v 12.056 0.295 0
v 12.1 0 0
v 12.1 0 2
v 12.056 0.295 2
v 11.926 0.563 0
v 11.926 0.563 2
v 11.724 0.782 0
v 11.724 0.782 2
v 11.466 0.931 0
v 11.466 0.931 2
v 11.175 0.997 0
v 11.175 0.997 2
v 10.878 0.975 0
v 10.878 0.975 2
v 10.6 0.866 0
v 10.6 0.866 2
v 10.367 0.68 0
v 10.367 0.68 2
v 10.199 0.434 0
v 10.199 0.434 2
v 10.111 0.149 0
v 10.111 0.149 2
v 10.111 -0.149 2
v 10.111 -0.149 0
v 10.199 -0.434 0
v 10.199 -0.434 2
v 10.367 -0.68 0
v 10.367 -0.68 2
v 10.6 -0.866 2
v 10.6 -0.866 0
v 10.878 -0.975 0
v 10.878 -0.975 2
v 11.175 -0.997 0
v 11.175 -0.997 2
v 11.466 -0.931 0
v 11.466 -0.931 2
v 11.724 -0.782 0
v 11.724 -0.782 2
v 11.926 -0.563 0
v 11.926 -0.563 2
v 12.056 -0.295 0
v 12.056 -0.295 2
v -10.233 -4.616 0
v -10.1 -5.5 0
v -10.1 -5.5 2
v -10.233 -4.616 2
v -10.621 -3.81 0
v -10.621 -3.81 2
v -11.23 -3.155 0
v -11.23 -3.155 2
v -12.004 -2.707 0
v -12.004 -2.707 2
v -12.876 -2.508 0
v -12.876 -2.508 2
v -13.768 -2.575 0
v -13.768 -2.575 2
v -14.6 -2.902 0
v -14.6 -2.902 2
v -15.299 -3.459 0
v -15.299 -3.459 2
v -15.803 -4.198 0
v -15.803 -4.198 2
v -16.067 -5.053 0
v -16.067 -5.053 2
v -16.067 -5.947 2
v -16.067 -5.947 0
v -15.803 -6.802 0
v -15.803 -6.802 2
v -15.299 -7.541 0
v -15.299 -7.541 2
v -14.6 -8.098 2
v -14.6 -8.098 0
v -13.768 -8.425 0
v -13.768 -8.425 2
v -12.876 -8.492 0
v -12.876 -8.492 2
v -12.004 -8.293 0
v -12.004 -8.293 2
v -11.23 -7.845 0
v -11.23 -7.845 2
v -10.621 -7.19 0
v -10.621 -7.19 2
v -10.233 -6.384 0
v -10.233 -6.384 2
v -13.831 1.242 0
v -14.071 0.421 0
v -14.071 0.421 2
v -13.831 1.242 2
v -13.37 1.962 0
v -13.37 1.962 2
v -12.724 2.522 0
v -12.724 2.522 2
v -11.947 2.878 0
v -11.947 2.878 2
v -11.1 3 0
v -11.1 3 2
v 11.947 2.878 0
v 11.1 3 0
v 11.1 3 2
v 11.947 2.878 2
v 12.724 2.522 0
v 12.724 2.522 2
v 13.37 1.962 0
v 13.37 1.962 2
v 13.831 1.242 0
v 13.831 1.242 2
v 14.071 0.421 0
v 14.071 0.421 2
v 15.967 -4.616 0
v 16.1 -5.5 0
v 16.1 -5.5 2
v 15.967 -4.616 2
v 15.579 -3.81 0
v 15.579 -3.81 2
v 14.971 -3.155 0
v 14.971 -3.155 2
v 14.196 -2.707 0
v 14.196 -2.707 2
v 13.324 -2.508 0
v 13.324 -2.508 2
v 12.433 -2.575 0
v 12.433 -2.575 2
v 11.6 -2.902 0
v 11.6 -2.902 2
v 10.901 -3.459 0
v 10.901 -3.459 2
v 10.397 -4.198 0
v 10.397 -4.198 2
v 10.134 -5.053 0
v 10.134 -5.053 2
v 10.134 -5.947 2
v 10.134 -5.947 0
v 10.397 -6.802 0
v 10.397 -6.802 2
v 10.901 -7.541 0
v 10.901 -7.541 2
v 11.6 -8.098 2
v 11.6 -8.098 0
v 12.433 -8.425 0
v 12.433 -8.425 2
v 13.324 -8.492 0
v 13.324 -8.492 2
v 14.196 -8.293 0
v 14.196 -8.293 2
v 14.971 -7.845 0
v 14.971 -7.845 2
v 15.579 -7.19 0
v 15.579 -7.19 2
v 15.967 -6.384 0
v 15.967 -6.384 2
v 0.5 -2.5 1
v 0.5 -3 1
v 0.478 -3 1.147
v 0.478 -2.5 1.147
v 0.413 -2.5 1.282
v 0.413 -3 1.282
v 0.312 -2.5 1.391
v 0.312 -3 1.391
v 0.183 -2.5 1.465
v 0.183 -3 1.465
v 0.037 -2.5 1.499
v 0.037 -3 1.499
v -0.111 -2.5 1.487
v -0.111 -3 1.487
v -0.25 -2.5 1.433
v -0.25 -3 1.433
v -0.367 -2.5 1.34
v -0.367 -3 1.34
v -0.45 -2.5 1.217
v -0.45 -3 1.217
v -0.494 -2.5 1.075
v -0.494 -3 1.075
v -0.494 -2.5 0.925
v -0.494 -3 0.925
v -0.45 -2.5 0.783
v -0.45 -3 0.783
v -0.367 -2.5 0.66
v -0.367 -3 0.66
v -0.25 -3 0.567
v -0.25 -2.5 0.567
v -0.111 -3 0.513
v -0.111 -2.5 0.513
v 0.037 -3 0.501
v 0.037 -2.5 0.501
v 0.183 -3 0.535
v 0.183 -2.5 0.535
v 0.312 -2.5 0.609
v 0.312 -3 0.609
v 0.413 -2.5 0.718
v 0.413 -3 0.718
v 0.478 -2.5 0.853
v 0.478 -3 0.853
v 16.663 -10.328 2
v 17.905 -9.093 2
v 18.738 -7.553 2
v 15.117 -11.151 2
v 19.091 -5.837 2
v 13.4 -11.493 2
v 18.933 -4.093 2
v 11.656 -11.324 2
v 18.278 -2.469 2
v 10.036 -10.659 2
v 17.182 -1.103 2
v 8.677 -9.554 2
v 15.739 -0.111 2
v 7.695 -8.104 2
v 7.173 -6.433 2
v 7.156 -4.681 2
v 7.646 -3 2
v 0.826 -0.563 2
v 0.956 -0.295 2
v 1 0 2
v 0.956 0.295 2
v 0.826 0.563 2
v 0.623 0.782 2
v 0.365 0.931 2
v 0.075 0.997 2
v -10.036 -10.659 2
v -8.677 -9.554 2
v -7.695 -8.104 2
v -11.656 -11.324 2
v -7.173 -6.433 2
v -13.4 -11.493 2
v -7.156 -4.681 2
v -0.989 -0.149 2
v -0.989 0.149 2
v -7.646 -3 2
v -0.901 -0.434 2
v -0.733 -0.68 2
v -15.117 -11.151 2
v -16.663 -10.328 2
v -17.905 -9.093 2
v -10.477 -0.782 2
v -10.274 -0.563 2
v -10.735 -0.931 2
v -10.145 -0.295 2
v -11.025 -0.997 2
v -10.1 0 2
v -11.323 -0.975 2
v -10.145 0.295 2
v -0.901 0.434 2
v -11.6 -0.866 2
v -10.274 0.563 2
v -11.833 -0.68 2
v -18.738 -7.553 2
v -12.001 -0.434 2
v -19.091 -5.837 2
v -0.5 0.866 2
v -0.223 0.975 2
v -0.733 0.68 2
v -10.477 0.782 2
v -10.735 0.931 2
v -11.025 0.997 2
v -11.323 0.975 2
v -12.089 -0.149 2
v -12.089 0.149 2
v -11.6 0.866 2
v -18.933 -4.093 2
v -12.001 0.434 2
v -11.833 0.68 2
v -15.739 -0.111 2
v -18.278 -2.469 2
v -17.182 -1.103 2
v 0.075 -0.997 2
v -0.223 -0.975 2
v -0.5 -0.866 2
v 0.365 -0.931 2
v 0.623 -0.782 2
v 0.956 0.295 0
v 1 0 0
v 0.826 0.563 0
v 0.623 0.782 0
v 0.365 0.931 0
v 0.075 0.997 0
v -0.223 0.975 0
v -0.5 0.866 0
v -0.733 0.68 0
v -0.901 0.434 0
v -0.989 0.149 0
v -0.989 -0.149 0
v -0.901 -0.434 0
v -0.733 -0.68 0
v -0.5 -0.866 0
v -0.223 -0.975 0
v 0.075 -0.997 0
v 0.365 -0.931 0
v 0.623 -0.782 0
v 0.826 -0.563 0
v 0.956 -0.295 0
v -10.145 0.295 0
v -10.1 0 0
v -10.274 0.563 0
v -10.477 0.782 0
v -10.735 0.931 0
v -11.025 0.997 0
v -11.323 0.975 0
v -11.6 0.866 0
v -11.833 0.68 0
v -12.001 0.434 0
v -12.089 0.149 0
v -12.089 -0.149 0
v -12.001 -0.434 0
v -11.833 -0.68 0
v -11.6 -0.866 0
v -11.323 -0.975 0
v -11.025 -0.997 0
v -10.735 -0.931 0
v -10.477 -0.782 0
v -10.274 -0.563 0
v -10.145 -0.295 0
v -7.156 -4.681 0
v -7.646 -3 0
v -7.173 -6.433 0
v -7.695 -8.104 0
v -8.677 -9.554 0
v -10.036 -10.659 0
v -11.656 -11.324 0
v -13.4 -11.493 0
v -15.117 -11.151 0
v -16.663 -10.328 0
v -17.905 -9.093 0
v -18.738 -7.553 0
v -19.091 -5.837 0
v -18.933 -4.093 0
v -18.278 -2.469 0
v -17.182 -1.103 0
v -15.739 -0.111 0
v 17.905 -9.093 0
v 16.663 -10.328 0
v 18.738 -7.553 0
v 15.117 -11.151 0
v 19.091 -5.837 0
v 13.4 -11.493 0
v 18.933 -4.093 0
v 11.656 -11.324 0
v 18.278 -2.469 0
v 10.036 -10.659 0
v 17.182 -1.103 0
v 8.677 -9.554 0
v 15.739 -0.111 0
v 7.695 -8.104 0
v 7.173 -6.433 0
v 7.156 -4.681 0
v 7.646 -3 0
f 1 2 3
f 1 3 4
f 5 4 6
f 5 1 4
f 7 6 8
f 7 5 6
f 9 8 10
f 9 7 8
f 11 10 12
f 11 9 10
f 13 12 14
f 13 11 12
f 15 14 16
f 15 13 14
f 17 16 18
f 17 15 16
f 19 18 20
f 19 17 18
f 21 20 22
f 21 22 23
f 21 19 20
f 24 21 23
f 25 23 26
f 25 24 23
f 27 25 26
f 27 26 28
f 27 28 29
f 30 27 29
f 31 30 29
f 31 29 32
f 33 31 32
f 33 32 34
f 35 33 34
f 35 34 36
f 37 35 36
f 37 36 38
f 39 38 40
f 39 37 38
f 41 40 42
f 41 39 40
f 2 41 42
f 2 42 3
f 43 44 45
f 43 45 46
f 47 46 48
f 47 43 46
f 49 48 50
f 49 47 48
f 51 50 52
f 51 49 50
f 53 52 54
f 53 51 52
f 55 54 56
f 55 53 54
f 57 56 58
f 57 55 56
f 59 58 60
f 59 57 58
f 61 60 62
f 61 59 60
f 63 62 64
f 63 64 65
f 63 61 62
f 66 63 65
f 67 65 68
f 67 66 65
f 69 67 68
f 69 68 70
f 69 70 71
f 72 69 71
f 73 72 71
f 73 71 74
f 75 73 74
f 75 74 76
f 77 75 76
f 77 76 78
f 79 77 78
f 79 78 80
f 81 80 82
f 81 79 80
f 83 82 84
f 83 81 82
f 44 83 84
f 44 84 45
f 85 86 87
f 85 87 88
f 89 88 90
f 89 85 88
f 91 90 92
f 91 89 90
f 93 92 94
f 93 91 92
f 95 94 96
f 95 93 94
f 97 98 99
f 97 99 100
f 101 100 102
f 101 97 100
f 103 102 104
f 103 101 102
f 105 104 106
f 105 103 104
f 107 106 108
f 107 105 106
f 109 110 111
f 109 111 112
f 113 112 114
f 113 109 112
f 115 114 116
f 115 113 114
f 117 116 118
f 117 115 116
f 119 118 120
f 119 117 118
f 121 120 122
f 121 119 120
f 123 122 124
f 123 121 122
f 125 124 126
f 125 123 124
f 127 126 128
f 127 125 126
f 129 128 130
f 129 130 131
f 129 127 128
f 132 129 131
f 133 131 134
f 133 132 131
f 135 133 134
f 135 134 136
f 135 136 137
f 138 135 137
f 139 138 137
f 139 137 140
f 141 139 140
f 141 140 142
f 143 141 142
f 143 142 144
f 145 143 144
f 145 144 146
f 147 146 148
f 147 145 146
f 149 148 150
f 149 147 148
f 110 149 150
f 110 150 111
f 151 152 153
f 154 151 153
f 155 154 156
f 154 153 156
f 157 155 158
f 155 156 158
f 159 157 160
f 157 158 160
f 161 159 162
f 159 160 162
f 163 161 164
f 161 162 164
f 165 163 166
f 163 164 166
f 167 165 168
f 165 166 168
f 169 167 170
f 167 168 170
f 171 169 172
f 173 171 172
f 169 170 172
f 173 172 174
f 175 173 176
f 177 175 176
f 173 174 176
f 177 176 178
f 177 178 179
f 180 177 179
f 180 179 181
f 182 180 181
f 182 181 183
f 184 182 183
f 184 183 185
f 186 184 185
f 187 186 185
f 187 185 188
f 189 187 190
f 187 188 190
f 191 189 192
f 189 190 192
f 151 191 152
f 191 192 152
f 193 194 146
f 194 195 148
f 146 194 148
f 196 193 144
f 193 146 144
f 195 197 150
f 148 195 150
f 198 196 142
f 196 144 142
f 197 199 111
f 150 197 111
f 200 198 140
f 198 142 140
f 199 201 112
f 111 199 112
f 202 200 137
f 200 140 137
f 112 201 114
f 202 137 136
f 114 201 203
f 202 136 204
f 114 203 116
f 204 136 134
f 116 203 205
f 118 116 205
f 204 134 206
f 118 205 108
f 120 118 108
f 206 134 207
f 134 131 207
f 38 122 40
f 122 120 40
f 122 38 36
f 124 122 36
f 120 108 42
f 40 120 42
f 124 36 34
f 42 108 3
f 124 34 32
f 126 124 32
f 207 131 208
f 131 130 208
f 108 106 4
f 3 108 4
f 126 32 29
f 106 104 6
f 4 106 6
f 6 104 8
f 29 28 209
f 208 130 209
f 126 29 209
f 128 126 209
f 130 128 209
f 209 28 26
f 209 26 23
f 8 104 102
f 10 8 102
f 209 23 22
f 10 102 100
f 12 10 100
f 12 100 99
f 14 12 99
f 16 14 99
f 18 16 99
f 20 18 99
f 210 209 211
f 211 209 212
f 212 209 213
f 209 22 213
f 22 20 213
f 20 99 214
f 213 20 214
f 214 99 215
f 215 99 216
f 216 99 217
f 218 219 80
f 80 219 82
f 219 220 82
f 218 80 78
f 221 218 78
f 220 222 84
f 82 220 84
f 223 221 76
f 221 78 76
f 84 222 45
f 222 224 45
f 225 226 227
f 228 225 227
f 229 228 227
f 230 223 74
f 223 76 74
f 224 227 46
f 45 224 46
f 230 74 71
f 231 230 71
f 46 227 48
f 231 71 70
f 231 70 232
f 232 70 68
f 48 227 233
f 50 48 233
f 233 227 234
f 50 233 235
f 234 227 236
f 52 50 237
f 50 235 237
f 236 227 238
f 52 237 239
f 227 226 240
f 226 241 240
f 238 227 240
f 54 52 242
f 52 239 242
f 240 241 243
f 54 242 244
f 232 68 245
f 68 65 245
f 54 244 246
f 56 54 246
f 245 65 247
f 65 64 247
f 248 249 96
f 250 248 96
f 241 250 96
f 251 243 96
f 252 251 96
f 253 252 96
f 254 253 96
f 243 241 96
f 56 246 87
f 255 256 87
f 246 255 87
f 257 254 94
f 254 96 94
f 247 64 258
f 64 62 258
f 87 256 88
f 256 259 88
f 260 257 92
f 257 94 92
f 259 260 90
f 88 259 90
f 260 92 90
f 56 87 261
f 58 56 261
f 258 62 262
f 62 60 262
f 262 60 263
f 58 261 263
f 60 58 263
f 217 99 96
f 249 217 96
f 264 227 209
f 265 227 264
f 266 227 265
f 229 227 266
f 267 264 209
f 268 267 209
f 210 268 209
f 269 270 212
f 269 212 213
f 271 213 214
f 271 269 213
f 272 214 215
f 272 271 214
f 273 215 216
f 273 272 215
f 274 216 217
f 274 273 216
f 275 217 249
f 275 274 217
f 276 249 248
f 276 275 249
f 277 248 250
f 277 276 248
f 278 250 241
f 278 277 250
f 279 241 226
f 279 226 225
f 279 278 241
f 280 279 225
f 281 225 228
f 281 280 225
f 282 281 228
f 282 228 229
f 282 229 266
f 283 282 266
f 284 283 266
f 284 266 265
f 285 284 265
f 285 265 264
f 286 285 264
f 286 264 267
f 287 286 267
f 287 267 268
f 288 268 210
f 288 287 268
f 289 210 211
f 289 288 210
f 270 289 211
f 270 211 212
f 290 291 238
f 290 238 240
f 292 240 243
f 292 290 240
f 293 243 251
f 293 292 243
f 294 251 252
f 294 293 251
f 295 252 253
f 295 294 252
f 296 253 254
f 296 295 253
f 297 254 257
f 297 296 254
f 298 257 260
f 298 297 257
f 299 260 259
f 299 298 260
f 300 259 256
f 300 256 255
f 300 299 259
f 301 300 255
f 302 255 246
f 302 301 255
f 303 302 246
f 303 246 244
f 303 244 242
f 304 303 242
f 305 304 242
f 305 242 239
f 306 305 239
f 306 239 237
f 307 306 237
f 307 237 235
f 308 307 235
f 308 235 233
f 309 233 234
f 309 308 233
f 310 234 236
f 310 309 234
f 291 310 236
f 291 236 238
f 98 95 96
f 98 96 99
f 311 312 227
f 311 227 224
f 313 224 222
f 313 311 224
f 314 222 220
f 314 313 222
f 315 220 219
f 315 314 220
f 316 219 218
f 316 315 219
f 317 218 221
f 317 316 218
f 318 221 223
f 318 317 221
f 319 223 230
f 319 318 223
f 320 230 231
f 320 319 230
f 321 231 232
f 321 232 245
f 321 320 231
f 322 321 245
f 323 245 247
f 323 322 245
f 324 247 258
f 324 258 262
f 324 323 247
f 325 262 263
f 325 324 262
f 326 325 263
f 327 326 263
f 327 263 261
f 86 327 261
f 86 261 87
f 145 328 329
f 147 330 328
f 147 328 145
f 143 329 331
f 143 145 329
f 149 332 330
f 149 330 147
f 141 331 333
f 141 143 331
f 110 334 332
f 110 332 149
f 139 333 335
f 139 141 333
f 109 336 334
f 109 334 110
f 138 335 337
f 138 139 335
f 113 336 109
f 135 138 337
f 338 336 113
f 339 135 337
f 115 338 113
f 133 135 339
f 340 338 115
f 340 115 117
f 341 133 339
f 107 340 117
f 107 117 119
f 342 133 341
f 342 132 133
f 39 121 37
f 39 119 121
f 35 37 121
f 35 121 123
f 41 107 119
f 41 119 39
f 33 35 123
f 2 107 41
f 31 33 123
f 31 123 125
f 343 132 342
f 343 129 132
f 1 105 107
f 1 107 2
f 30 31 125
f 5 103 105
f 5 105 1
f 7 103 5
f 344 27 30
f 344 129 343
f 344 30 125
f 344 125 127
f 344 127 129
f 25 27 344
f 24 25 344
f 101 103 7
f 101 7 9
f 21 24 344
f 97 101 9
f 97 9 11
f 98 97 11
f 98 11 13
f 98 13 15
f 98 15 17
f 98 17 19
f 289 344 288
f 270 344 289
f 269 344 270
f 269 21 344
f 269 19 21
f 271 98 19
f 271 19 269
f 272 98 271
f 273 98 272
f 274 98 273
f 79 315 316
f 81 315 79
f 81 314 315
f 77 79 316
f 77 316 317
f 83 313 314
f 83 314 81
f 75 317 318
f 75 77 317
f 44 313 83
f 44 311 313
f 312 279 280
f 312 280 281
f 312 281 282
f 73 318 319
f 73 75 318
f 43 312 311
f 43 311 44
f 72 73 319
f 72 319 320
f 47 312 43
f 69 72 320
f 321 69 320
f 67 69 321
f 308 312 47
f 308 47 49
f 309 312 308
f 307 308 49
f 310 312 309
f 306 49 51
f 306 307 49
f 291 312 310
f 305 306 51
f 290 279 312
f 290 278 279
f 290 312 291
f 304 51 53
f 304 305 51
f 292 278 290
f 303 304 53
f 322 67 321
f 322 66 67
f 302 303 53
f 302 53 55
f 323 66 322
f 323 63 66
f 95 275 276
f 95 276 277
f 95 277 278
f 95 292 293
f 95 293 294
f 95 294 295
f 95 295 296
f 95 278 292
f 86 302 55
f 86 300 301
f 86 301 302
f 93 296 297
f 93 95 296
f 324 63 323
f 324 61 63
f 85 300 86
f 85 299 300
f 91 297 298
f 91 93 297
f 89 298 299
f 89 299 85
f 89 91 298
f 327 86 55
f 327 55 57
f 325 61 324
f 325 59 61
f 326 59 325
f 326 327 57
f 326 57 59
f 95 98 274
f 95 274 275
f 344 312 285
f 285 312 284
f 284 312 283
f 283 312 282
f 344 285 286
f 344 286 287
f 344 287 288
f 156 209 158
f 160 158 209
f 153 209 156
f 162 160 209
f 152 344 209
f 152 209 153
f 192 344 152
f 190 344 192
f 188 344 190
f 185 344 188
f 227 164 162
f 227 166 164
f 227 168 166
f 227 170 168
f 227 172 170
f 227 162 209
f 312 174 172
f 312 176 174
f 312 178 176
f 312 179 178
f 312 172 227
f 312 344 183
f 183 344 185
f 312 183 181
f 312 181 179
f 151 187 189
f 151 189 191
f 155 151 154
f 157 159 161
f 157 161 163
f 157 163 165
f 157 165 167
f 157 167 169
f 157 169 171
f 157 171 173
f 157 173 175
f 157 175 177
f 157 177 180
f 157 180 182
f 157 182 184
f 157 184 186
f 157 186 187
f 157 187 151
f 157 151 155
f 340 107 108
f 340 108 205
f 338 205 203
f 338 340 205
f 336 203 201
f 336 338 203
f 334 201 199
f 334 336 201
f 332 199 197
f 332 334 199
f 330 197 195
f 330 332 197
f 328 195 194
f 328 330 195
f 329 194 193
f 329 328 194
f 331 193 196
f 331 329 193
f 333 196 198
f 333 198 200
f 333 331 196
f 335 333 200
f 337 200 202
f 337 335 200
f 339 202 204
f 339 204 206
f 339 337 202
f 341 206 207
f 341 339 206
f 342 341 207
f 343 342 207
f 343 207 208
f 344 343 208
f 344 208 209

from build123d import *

# Parameters (mm, degrees)
SKETCH1_R           = 1
SKETCH1_R_2         = 3
BOSS_EXTRUDE1_DEPTH = 2
SKETCH2_R           = 0.5
CUT_EXTRUDE1_DEPTH  = 0.5


with BuildPart() as part:
    # Sketch1 → Boss-Extrude1 (new body)
    with BuildSketch(Plane.XY):
        with BuildLine():
            Line((-11.100190374, 3), (11.100190374, 3))
            ThreePointArc((11.100190374, 3), (13.067032348, 2.265288646), (14.070500235, 0.421021768))
            ThreePointArc((14.070500235, 0.421021768), (15.920210774, -10.795987627), (7.645834317, -3))
            Line((7.645834317, -3), (-7.645834317, -3))
            ThreePointArc((-7.645834317, -3), (-15.920210774, -10.795987627), (-14.070500235, 0.421021768))
            ThreePointArc((-14.070500235, 0.421021768), (-13.067032348, 2.265288646), (-11.100190374, 3))
        make_face()
        Circle(SKETCH1_R, mode=Mode.SUBTRACT)
        with Locations((-13.100190374, -5.5)):
            Circle(SKETCH1_R_2, mode=Mode.SUBTRACT)
        with Locations((13.100190374, -5.5)):
            Circle(SKETCH1_R_2, mode=Mode.SUBTRACT)
        with Locations((-11.100190374, 0)):
            Circle(SKETCH1_R, mode=Mode.SUBTRACT)
        with Locations((11.100190374, 0)):
            Circle(SKETCH1_R, mode=Mode.SUBTRACT)
    extrude(amount=BOSS_EXTRUDE1_DEPTH)

    # Sketch2 → Cut-Extrude1 (cut)
    with BuildSketch(Plane.XZ.offset(3)):
        with Locations((0, 1)):
            Circle(SKETCH2_R)
    extrude(amount=-CUT_EXTRUDE1_DEPTH, mode=Mode.SUBTRACT)


solid = part.part
